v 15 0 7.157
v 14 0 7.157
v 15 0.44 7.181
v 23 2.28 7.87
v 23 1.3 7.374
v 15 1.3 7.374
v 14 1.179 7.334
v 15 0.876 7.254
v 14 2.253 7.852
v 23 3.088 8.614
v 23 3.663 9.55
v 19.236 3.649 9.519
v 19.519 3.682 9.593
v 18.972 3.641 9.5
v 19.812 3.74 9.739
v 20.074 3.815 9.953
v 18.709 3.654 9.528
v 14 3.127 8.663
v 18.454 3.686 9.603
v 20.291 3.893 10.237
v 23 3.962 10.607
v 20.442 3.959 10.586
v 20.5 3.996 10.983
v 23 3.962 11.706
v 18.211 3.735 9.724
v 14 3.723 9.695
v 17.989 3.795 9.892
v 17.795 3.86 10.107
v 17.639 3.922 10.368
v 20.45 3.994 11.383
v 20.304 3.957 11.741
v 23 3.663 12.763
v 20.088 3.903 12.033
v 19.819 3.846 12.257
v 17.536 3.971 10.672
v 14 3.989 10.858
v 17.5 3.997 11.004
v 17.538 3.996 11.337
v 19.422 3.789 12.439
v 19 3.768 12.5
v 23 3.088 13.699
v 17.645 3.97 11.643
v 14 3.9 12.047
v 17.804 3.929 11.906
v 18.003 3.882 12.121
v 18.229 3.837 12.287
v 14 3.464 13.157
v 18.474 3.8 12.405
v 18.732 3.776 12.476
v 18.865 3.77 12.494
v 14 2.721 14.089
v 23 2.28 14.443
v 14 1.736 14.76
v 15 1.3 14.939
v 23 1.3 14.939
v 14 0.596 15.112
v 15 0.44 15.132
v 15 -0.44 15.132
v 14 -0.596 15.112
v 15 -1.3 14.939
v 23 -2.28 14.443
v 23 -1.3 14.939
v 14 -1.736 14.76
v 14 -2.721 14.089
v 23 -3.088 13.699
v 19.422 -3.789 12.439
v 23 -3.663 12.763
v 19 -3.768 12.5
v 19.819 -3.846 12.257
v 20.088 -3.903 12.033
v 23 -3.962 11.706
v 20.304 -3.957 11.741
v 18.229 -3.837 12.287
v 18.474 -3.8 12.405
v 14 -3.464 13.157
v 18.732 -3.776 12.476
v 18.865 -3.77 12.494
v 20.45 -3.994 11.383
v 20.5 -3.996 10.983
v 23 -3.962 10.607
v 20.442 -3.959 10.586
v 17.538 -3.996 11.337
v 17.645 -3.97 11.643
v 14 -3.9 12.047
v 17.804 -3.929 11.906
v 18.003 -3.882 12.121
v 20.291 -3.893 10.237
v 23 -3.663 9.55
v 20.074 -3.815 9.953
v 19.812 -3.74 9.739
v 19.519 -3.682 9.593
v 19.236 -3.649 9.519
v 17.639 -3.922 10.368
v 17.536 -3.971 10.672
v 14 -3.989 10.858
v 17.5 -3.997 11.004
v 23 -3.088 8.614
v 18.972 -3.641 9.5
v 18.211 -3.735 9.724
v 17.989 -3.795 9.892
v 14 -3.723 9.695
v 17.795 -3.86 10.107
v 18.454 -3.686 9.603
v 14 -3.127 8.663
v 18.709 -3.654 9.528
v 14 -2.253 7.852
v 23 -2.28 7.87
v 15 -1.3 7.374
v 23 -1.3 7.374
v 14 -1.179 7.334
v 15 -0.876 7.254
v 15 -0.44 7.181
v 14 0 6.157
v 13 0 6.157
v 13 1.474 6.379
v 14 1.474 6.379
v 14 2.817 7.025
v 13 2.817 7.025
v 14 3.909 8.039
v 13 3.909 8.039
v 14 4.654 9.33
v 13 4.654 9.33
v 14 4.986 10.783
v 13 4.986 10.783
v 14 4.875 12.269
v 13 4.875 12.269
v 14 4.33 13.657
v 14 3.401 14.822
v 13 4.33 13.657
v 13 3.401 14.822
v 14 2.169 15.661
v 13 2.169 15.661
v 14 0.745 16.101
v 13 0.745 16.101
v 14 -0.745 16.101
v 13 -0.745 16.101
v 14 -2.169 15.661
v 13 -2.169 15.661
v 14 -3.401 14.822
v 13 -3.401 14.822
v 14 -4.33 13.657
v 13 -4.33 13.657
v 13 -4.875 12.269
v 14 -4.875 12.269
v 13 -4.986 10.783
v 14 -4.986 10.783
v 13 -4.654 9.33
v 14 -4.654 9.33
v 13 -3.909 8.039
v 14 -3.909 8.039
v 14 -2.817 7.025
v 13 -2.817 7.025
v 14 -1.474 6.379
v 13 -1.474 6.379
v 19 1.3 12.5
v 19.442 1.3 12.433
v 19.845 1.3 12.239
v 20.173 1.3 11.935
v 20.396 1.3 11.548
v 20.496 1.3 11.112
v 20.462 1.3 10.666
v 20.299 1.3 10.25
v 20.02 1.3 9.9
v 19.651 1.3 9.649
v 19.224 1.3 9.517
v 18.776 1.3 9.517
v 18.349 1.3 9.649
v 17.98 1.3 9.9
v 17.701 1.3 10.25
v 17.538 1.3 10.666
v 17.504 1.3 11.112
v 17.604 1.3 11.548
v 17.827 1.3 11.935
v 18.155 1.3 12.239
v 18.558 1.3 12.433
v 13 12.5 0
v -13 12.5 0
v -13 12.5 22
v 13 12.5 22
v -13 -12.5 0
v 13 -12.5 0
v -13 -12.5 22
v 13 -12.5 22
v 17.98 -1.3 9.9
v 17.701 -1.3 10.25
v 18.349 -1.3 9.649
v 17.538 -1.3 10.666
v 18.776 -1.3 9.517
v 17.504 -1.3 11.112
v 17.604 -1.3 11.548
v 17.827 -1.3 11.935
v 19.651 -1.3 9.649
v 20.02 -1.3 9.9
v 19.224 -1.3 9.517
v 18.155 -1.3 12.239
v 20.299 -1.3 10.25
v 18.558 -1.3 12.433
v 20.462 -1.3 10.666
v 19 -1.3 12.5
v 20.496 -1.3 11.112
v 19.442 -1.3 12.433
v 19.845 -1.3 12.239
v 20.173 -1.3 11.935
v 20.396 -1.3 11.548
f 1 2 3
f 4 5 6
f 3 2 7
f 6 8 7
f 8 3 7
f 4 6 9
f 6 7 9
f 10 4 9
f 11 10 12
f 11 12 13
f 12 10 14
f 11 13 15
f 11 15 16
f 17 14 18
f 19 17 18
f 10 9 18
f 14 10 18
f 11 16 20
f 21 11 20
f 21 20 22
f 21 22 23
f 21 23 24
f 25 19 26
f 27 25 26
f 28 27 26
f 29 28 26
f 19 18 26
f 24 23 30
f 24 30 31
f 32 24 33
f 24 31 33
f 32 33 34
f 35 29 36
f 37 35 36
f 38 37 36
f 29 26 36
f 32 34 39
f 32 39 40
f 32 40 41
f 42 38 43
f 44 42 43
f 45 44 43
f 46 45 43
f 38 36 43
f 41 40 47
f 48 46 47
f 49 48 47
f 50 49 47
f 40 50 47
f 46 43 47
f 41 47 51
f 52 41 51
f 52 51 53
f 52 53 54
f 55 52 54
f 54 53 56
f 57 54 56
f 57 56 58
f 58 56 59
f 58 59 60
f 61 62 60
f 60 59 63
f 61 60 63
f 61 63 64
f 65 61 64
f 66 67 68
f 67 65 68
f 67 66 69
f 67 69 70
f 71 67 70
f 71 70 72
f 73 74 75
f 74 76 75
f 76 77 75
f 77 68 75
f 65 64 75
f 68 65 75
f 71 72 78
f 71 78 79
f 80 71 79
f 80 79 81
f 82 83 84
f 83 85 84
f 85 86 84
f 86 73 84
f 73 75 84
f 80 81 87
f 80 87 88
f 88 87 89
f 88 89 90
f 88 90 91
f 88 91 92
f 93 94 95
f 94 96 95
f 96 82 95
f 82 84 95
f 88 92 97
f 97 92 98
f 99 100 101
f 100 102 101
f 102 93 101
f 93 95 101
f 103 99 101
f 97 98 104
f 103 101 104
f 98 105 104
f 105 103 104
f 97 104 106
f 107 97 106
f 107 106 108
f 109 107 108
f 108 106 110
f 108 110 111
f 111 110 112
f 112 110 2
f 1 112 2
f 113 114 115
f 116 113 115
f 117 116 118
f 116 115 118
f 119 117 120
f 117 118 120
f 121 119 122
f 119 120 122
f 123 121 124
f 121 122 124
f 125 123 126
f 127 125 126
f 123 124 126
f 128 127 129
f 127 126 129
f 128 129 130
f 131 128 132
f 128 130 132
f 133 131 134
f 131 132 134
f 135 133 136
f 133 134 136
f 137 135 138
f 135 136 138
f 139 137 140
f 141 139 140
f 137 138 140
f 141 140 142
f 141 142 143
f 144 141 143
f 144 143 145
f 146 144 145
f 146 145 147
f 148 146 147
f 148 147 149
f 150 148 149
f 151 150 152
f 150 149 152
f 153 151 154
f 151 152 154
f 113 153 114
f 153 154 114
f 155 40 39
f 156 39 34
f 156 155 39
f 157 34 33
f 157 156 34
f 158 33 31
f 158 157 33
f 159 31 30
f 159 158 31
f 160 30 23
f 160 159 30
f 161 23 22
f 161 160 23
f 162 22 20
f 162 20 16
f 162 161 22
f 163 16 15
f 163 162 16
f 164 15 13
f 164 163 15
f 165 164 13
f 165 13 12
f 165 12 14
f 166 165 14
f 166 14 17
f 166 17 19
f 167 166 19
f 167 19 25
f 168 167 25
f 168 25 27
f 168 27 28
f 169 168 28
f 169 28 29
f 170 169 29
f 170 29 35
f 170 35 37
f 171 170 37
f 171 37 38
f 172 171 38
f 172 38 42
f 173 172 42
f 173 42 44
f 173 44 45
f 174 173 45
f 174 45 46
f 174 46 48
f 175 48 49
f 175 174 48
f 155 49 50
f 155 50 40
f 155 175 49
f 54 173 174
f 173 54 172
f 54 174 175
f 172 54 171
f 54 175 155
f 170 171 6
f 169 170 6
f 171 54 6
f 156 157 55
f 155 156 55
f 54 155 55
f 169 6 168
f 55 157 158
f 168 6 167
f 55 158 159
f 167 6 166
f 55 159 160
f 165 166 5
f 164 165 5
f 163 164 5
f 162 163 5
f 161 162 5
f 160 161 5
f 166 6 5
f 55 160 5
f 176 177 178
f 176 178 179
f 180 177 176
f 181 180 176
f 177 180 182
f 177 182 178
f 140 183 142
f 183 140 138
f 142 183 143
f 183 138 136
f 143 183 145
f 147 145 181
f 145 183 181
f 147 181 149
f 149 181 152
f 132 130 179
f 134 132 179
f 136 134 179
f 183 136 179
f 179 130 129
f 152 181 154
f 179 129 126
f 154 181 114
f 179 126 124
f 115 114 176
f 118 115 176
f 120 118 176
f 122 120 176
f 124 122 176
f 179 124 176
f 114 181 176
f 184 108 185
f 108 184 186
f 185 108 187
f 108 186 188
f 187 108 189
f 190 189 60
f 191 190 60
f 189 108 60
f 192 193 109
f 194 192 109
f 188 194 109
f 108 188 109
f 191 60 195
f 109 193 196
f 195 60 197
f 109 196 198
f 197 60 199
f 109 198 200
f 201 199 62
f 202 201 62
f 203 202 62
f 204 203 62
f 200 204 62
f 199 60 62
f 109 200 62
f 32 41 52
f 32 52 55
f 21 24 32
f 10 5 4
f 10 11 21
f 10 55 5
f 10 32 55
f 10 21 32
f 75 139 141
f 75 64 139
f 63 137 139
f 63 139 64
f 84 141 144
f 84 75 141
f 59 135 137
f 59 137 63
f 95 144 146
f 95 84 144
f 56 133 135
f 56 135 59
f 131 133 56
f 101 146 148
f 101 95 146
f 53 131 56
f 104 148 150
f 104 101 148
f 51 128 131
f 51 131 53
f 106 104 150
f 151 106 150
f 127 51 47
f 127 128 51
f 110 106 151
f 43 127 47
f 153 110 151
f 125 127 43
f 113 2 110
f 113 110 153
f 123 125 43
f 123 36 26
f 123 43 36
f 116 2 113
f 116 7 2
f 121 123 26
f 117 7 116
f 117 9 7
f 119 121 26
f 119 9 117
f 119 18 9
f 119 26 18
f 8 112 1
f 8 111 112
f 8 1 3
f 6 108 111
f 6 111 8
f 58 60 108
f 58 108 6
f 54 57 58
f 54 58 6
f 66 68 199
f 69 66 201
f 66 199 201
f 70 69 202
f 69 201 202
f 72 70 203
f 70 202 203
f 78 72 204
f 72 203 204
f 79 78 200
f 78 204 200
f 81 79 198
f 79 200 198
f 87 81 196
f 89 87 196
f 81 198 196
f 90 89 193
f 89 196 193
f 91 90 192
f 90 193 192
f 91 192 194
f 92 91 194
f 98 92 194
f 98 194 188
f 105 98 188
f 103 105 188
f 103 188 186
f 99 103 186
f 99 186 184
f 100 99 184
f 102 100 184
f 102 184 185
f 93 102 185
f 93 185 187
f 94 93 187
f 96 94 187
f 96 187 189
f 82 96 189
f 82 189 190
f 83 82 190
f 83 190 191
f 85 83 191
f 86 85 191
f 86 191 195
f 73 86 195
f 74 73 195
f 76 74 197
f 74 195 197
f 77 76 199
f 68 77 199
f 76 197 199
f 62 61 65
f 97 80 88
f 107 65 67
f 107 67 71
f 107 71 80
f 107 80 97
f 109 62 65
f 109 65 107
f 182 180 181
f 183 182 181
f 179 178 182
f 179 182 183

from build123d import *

# Parameters (mm, degrees)
SKETCH3_W           = 26
SKETCH3_H           = 25
BOSS_EXTRUDE2_DEPTH = 22
SKETCH4_R           = 5
BOSS_EXTRUDE3_DEPTH = 1
SKETCH5_R           = 4
BOSS_EXTRUDE4_DEPTH = 9
SKETCH7_W           = 8
SKETCH7_H           = 2.6
CUT_EXTRUDE1_DEPTH  = 5
SKETCH8_R           = 1.5
CUT_EXTRUDE2_DEPTH  = 6


with BuildPart() as part:
    # Sketch3 → Boss-Extrude2 (new body)
    with BuildSketch(Plane.XY):
        Rectangle(SKETCH3_W, SKETCH3_H)
    extrude(amount=BOSS_EXTRUDE2_DEPTH)

    # Sketch4 → Boss-Extrude3 (add)
    with BuildSketch(Plane(origin=(13, 0, 0), x_dir=(0, 0, -1), z_dir=(1, 0, 0))):
        with Locations((-11.15653954, 0)):
            Circle(SKETCH4_R)
    extrude(amount=BOSS_EXTRUDE3_DEPTH)

    # Sketch5 → Boss-Extrude4 (add)
    with BuildSketch(Plane(origin=(14, 0, 0), x_dir=(0, 0, -1), z_dir=(1, 0, 0))):
        with Locations((-11.15653954, 0)):
            Circle(SKETCH5_R)
    extrude(amount=BOSS_EXTRUDE4_DEPTH)

    # Sketch7 → Cut-Extrude1 (cut)
    with BuildSketch(Plane.XY.offset(11)):
        with Locations((19, 0)):
            Rectangle(SKETCH7_W, SKETCH7_H)
    cut_extrude1 = extrude(amount=-CUT_EXTRUDE1_DEPTH, mode=Mode.SUBTRACT)

    # Mirror1: Cut-Extrude1 across plane
    add(cut_extrude1.mirror(Plane.XY.offset(11)), mode=Mode.SUBTRACT)

    # Sketch8 → Cut-Extrude2 (cut)
    with BuildSketch(Plane(origin=(0, 0, 0), x_dir=(1, 0, 0), z_dir=(0, 1, 0))):
        with Locations(Location((19, -11, 0), (0, 0, 270))):
            Circle(SKETCH8_R)
    cut_extrude2 = extrude(amount=-CUT_EXTRUDE2_DEPTH, mode=Mode.SUBTRACT)

    # Mirror2: Cut-Extrude2 across plane
    add(cut_extrude2.mirror(Plane.ZX), mode=Mode.SUBTRACT)


solid = part.part
